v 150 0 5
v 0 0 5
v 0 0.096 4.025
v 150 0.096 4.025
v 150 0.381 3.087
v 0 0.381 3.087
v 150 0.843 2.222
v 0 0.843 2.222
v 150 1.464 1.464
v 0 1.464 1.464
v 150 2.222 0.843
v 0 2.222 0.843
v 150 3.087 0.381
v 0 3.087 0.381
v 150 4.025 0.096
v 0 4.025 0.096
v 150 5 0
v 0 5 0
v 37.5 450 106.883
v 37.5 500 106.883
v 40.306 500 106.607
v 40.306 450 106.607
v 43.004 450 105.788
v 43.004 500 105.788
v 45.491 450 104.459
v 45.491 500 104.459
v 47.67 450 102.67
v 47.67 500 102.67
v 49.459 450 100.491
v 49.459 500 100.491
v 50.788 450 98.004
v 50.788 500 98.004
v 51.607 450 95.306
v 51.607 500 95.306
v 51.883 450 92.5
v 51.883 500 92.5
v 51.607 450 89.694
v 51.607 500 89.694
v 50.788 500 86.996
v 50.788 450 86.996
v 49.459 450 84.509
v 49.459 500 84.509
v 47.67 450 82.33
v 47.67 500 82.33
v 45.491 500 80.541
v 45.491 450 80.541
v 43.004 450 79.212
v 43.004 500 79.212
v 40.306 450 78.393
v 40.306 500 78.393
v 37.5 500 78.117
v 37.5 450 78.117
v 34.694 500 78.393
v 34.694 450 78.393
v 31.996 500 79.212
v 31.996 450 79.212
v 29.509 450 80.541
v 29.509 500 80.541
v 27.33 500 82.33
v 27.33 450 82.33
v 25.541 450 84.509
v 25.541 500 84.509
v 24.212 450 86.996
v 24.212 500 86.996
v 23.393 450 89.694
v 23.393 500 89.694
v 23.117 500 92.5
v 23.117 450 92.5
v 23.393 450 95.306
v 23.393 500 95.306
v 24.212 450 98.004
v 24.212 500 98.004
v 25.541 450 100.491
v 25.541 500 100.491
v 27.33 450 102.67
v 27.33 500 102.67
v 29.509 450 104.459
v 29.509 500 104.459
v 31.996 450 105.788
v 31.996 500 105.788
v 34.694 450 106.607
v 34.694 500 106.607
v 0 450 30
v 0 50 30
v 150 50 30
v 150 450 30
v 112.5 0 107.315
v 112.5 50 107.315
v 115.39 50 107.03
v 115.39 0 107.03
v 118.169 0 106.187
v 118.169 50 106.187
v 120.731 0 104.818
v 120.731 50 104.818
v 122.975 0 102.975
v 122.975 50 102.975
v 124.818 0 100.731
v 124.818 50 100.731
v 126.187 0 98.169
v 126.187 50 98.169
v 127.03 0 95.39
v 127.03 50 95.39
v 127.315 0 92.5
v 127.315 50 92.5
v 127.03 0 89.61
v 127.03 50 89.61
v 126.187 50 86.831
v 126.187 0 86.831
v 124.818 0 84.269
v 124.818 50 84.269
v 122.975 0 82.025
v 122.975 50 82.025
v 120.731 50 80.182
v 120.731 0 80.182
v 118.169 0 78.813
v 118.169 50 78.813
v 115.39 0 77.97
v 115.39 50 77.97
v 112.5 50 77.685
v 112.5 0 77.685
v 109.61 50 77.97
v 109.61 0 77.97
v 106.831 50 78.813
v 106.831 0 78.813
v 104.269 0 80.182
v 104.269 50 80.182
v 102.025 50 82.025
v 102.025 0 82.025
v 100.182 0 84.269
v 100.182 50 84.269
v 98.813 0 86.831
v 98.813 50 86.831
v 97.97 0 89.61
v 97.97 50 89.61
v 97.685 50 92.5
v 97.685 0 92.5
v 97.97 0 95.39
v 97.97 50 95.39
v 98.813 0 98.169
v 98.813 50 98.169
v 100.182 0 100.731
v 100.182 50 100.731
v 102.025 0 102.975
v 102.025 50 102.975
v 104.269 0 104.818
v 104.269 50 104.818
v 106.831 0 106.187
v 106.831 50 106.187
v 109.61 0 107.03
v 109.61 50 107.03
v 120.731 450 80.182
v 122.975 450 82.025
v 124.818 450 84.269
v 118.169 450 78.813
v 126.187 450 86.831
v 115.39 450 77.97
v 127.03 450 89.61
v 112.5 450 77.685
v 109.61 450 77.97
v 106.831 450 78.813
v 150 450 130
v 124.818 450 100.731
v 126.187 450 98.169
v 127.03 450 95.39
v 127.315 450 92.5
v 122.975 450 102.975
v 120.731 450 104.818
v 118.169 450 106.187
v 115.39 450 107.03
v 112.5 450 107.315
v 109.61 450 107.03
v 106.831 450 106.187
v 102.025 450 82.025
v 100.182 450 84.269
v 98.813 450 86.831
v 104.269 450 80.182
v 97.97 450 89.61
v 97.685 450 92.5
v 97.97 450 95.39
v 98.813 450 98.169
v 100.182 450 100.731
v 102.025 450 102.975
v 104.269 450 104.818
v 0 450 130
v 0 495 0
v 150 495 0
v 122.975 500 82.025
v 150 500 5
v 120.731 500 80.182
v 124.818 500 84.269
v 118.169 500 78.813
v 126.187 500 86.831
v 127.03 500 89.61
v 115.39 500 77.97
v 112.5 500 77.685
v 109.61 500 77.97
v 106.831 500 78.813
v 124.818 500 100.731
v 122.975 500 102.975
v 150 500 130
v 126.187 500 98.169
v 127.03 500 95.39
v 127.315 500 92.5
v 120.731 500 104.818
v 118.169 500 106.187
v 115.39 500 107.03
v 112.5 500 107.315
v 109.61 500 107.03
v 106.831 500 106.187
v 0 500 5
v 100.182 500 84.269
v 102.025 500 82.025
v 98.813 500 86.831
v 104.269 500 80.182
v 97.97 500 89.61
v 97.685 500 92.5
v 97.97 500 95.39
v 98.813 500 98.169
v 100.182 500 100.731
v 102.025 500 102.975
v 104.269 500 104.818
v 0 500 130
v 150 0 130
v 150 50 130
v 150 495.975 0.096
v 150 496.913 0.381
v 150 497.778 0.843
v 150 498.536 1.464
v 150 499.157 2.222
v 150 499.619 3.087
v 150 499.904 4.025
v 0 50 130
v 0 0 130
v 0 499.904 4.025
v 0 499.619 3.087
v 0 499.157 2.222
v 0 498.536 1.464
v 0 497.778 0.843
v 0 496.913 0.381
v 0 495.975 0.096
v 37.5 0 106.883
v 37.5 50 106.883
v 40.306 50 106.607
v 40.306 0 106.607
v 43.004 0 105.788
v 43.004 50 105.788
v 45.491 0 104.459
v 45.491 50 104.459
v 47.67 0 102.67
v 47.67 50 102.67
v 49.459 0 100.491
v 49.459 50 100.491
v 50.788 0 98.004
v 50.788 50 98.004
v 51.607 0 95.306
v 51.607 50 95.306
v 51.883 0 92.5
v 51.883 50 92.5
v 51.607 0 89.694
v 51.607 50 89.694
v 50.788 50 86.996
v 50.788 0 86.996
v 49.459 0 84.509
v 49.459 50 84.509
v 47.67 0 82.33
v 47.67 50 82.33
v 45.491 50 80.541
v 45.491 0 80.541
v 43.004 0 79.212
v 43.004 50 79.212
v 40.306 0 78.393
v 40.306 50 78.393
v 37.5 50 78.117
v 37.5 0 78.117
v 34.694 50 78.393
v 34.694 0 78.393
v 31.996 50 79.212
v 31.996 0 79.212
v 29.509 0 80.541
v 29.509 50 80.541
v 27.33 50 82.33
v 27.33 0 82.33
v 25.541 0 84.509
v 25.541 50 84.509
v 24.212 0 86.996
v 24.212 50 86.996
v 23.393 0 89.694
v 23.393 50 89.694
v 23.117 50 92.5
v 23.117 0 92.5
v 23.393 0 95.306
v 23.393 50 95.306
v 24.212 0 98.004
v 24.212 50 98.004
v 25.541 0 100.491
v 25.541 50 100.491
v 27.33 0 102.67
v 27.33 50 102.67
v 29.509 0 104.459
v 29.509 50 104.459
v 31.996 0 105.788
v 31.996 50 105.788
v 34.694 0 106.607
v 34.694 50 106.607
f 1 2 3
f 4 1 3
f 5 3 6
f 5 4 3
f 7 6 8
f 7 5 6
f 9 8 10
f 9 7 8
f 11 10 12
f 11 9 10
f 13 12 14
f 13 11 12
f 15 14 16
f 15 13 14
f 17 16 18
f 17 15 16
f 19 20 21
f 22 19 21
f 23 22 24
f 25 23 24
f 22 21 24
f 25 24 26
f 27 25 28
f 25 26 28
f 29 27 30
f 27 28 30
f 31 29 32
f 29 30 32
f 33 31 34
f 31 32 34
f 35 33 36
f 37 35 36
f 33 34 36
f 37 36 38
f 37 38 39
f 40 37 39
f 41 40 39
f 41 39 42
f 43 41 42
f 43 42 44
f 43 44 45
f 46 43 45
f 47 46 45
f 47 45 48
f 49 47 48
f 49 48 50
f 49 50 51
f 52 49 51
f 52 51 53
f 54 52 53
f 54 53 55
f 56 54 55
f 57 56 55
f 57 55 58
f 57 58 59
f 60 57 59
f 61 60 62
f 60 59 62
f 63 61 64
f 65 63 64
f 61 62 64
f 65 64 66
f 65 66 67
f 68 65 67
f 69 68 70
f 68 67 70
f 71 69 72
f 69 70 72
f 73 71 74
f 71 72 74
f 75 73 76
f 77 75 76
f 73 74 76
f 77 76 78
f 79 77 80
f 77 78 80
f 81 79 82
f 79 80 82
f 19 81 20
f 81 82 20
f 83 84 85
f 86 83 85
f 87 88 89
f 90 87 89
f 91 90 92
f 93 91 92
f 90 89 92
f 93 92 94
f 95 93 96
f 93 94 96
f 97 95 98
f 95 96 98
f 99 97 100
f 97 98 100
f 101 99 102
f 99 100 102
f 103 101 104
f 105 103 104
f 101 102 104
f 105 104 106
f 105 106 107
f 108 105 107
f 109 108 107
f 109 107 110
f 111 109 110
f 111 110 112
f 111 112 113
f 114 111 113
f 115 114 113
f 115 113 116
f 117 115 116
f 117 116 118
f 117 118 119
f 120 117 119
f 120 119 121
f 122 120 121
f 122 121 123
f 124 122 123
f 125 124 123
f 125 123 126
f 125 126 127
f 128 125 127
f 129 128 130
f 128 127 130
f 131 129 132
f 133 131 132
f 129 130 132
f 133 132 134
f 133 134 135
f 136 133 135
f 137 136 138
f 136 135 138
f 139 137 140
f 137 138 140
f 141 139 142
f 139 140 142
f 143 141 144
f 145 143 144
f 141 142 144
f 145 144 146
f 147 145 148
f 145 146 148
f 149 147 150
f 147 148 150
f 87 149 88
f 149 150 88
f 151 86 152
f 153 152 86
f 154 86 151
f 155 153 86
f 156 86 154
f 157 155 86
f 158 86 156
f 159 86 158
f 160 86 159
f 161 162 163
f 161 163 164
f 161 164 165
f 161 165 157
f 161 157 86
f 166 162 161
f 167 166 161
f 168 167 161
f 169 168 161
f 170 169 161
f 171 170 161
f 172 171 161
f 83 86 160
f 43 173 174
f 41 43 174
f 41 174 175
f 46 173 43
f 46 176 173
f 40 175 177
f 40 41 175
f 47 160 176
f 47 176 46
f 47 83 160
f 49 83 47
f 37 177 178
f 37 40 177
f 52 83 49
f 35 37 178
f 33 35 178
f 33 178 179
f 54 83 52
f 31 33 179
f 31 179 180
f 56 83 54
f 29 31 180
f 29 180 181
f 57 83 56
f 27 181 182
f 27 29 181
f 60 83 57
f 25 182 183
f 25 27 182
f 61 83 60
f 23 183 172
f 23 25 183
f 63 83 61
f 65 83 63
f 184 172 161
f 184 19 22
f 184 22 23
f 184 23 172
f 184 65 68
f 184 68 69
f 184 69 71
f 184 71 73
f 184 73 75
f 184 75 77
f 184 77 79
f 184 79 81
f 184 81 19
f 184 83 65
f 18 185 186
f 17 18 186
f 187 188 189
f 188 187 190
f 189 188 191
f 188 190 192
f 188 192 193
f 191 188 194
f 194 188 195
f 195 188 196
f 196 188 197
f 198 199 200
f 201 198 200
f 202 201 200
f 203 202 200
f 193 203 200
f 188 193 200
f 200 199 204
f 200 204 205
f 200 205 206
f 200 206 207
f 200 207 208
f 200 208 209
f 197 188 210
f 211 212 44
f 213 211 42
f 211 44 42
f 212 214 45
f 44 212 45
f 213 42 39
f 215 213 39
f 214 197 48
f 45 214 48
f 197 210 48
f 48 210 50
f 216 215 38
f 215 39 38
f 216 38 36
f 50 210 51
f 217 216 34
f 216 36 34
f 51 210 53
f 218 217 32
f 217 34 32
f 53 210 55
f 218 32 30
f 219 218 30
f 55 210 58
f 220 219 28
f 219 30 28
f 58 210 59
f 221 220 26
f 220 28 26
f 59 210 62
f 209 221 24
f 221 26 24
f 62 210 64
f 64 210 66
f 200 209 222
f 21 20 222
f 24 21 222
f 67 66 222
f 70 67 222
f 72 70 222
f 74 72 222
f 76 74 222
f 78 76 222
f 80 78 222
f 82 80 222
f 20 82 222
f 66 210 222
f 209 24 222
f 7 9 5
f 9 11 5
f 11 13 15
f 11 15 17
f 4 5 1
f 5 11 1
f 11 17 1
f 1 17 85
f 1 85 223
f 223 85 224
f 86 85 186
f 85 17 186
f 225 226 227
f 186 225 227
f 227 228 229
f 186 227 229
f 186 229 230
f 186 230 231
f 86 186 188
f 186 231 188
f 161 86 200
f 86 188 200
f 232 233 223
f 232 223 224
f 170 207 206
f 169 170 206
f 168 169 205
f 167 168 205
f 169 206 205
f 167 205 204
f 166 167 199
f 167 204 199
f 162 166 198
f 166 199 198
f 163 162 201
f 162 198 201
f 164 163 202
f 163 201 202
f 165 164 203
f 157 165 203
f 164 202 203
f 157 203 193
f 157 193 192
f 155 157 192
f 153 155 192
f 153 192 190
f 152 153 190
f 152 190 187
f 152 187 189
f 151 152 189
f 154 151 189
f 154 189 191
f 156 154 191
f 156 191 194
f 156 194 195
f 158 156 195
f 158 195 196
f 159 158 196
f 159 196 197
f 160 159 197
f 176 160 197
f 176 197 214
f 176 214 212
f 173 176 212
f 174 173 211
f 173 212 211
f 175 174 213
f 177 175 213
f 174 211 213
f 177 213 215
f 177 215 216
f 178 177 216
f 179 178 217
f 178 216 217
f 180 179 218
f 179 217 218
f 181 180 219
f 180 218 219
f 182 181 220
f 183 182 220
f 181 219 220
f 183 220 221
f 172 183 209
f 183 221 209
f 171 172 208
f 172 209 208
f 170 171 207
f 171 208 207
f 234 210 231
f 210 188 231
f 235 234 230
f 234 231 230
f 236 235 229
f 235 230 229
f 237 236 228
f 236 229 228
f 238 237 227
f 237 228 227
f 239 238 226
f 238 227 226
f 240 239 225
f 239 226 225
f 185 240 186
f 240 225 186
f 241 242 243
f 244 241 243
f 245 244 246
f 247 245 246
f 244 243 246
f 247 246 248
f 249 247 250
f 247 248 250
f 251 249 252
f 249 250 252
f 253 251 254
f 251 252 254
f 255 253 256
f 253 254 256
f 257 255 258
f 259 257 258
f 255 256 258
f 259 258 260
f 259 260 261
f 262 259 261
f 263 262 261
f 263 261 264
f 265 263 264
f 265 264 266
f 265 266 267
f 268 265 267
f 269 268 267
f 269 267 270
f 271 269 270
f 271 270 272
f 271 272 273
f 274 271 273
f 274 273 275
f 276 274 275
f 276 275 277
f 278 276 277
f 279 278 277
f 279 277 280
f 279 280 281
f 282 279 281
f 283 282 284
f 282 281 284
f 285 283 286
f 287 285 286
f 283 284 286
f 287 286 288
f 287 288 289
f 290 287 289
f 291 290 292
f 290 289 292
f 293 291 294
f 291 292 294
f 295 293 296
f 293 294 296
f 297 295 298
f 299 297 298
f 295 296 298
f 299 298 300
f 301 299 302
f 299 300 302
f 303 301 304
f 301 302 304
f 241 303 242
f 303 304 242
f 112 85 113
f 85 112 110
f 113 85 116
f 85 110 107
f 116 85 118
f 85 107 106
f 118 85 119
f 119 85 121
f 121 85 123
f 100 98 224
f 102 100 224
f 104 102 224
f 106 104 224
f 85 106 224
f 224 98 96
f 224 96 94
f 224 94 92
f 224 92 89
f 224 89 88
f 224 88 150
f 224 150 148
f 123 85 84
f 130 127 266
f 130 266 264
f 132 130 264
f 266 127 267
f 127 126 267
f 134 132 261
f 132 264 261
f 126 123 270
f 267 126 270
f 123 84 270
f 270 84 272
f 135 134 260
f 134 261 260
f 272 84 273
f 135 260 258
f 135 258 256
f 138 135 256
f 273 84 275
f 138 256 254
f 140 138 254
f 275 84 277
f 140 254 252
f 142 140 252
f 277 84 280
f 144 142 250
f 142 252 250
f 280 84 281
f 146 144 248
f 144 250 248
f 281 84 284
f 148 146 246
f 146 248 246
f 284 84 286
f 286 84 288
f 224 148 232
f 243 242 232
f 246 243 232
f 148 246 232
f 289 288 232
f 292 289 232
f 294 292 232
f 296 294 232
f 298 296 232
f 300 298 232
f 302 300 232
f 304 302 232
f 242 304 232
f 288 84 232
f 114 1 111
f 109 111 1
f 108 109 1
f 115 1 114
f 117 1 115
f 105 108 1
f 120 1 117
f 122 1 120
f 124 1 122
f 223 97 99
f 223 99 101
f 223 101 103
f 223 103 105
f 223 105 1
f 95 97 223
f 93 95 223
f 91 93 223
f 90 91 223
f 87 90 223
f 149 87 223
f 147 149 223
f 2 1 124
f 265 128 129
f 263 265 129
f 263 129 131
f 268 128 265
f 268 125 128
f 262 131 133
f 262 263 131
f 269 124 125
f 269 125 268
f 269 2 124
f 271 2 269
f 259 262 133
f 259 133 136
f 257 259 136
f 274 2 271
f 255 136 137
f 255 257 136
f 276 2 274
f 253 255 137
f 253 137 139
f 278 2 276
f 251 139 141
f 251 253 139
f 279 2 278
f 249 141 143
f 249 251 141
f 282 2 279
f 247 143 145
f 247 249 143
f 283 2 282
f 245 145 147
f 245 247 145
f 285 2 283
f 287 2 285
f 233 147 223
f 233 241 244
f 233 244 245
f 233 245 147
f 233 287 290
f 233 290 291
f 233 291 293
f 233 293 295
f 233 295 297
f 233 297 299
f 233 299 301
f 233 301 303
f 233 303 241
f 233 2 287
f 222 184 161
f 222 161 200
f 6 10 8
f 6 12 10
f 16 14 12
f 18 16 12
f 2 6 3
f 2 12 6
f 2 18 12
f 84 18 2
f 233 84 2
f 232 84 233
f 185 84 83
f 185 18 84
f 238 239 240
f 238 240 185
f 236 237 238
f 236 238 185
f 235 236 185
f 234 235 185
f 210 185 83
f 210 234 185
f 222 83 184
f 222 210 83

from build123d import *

# Parameters (mm, degrees)
SKETCH1_W           = 150
SKETCH1_H           = 500
BOSS_EXTRUDE1_DEPTH = 30
SKETCH2_W           = 100
SKETCH2_H           = 50
BOSS_EXTRUDE2_DEPTH = 150
SKETCH3_W           = 100
SKETCH3_H           = 50
BOSS_EXTRUDE3_DEPTH = 150
FILLET1_R           = 5
SKETCH4_R           = 14.383133374
SKETCH4_R_2         = 14.814559663
CUT_EXTRUDE1_DEPTH  = 538.959106253


with BuildPart() as part:
    # Sketch1 → Boss-Extrude1 (new body)
    with BuildSketch(Plane.XY):
        with Locations((75, 250)):
            Rectangle(SKETCH1_W, SKETCH1_H)
    extrude(amount=BOSS_EXTRUDE1_DEPTH)

    # Sketch2 → Boss-Extrude2 (add)
    with BuildSketch(Plane.ZY):
        with Locations((80, 475)):
            Rectangle(SKETCH2_W, SKETCH2_H)
    extrude(amount=-BOSS_EXTRUDE2_DEPTH)

    # Sketch3 → Boss-Extrude3 (add)
    with BuildSketch(Plane.ZY):
        with Locations((80, 25)):
            Rectangle(SKETCH3_W, SKETCH3_H)
    extrude(amount=-BOSS_EXTRUDE3_DEPTH)

    # Fillet1
    fillet1_edges = [part.edges().sort_by_distance(p)[0] for p in [
        (75, 500, 0),
        (75, 0, 0),
    ]]
    fillet(fillet1_edges, radius=FILLET1_R)

    # Sketch4 → Cut-Extrude1 (cut, through all)
    with BuildSketch(Plane(origin=(0, 500, 0), x_dir=(1, 0, 0), z_dir=(0, 1, 0))):
        with Locations(Location((37.5, -92.5, 0), (0, 0, 270))):
            Circle(SKETCH4_R)
        with Locations(Location((112.5, -92.5, 0), (0, 0, 270))):
            Circle(SKETCH4_R_2)
    extrude(amount=-CUT_EXTRUDE1_DEPTH, mode=Mode.SUBTRACT)


solid = part.part
